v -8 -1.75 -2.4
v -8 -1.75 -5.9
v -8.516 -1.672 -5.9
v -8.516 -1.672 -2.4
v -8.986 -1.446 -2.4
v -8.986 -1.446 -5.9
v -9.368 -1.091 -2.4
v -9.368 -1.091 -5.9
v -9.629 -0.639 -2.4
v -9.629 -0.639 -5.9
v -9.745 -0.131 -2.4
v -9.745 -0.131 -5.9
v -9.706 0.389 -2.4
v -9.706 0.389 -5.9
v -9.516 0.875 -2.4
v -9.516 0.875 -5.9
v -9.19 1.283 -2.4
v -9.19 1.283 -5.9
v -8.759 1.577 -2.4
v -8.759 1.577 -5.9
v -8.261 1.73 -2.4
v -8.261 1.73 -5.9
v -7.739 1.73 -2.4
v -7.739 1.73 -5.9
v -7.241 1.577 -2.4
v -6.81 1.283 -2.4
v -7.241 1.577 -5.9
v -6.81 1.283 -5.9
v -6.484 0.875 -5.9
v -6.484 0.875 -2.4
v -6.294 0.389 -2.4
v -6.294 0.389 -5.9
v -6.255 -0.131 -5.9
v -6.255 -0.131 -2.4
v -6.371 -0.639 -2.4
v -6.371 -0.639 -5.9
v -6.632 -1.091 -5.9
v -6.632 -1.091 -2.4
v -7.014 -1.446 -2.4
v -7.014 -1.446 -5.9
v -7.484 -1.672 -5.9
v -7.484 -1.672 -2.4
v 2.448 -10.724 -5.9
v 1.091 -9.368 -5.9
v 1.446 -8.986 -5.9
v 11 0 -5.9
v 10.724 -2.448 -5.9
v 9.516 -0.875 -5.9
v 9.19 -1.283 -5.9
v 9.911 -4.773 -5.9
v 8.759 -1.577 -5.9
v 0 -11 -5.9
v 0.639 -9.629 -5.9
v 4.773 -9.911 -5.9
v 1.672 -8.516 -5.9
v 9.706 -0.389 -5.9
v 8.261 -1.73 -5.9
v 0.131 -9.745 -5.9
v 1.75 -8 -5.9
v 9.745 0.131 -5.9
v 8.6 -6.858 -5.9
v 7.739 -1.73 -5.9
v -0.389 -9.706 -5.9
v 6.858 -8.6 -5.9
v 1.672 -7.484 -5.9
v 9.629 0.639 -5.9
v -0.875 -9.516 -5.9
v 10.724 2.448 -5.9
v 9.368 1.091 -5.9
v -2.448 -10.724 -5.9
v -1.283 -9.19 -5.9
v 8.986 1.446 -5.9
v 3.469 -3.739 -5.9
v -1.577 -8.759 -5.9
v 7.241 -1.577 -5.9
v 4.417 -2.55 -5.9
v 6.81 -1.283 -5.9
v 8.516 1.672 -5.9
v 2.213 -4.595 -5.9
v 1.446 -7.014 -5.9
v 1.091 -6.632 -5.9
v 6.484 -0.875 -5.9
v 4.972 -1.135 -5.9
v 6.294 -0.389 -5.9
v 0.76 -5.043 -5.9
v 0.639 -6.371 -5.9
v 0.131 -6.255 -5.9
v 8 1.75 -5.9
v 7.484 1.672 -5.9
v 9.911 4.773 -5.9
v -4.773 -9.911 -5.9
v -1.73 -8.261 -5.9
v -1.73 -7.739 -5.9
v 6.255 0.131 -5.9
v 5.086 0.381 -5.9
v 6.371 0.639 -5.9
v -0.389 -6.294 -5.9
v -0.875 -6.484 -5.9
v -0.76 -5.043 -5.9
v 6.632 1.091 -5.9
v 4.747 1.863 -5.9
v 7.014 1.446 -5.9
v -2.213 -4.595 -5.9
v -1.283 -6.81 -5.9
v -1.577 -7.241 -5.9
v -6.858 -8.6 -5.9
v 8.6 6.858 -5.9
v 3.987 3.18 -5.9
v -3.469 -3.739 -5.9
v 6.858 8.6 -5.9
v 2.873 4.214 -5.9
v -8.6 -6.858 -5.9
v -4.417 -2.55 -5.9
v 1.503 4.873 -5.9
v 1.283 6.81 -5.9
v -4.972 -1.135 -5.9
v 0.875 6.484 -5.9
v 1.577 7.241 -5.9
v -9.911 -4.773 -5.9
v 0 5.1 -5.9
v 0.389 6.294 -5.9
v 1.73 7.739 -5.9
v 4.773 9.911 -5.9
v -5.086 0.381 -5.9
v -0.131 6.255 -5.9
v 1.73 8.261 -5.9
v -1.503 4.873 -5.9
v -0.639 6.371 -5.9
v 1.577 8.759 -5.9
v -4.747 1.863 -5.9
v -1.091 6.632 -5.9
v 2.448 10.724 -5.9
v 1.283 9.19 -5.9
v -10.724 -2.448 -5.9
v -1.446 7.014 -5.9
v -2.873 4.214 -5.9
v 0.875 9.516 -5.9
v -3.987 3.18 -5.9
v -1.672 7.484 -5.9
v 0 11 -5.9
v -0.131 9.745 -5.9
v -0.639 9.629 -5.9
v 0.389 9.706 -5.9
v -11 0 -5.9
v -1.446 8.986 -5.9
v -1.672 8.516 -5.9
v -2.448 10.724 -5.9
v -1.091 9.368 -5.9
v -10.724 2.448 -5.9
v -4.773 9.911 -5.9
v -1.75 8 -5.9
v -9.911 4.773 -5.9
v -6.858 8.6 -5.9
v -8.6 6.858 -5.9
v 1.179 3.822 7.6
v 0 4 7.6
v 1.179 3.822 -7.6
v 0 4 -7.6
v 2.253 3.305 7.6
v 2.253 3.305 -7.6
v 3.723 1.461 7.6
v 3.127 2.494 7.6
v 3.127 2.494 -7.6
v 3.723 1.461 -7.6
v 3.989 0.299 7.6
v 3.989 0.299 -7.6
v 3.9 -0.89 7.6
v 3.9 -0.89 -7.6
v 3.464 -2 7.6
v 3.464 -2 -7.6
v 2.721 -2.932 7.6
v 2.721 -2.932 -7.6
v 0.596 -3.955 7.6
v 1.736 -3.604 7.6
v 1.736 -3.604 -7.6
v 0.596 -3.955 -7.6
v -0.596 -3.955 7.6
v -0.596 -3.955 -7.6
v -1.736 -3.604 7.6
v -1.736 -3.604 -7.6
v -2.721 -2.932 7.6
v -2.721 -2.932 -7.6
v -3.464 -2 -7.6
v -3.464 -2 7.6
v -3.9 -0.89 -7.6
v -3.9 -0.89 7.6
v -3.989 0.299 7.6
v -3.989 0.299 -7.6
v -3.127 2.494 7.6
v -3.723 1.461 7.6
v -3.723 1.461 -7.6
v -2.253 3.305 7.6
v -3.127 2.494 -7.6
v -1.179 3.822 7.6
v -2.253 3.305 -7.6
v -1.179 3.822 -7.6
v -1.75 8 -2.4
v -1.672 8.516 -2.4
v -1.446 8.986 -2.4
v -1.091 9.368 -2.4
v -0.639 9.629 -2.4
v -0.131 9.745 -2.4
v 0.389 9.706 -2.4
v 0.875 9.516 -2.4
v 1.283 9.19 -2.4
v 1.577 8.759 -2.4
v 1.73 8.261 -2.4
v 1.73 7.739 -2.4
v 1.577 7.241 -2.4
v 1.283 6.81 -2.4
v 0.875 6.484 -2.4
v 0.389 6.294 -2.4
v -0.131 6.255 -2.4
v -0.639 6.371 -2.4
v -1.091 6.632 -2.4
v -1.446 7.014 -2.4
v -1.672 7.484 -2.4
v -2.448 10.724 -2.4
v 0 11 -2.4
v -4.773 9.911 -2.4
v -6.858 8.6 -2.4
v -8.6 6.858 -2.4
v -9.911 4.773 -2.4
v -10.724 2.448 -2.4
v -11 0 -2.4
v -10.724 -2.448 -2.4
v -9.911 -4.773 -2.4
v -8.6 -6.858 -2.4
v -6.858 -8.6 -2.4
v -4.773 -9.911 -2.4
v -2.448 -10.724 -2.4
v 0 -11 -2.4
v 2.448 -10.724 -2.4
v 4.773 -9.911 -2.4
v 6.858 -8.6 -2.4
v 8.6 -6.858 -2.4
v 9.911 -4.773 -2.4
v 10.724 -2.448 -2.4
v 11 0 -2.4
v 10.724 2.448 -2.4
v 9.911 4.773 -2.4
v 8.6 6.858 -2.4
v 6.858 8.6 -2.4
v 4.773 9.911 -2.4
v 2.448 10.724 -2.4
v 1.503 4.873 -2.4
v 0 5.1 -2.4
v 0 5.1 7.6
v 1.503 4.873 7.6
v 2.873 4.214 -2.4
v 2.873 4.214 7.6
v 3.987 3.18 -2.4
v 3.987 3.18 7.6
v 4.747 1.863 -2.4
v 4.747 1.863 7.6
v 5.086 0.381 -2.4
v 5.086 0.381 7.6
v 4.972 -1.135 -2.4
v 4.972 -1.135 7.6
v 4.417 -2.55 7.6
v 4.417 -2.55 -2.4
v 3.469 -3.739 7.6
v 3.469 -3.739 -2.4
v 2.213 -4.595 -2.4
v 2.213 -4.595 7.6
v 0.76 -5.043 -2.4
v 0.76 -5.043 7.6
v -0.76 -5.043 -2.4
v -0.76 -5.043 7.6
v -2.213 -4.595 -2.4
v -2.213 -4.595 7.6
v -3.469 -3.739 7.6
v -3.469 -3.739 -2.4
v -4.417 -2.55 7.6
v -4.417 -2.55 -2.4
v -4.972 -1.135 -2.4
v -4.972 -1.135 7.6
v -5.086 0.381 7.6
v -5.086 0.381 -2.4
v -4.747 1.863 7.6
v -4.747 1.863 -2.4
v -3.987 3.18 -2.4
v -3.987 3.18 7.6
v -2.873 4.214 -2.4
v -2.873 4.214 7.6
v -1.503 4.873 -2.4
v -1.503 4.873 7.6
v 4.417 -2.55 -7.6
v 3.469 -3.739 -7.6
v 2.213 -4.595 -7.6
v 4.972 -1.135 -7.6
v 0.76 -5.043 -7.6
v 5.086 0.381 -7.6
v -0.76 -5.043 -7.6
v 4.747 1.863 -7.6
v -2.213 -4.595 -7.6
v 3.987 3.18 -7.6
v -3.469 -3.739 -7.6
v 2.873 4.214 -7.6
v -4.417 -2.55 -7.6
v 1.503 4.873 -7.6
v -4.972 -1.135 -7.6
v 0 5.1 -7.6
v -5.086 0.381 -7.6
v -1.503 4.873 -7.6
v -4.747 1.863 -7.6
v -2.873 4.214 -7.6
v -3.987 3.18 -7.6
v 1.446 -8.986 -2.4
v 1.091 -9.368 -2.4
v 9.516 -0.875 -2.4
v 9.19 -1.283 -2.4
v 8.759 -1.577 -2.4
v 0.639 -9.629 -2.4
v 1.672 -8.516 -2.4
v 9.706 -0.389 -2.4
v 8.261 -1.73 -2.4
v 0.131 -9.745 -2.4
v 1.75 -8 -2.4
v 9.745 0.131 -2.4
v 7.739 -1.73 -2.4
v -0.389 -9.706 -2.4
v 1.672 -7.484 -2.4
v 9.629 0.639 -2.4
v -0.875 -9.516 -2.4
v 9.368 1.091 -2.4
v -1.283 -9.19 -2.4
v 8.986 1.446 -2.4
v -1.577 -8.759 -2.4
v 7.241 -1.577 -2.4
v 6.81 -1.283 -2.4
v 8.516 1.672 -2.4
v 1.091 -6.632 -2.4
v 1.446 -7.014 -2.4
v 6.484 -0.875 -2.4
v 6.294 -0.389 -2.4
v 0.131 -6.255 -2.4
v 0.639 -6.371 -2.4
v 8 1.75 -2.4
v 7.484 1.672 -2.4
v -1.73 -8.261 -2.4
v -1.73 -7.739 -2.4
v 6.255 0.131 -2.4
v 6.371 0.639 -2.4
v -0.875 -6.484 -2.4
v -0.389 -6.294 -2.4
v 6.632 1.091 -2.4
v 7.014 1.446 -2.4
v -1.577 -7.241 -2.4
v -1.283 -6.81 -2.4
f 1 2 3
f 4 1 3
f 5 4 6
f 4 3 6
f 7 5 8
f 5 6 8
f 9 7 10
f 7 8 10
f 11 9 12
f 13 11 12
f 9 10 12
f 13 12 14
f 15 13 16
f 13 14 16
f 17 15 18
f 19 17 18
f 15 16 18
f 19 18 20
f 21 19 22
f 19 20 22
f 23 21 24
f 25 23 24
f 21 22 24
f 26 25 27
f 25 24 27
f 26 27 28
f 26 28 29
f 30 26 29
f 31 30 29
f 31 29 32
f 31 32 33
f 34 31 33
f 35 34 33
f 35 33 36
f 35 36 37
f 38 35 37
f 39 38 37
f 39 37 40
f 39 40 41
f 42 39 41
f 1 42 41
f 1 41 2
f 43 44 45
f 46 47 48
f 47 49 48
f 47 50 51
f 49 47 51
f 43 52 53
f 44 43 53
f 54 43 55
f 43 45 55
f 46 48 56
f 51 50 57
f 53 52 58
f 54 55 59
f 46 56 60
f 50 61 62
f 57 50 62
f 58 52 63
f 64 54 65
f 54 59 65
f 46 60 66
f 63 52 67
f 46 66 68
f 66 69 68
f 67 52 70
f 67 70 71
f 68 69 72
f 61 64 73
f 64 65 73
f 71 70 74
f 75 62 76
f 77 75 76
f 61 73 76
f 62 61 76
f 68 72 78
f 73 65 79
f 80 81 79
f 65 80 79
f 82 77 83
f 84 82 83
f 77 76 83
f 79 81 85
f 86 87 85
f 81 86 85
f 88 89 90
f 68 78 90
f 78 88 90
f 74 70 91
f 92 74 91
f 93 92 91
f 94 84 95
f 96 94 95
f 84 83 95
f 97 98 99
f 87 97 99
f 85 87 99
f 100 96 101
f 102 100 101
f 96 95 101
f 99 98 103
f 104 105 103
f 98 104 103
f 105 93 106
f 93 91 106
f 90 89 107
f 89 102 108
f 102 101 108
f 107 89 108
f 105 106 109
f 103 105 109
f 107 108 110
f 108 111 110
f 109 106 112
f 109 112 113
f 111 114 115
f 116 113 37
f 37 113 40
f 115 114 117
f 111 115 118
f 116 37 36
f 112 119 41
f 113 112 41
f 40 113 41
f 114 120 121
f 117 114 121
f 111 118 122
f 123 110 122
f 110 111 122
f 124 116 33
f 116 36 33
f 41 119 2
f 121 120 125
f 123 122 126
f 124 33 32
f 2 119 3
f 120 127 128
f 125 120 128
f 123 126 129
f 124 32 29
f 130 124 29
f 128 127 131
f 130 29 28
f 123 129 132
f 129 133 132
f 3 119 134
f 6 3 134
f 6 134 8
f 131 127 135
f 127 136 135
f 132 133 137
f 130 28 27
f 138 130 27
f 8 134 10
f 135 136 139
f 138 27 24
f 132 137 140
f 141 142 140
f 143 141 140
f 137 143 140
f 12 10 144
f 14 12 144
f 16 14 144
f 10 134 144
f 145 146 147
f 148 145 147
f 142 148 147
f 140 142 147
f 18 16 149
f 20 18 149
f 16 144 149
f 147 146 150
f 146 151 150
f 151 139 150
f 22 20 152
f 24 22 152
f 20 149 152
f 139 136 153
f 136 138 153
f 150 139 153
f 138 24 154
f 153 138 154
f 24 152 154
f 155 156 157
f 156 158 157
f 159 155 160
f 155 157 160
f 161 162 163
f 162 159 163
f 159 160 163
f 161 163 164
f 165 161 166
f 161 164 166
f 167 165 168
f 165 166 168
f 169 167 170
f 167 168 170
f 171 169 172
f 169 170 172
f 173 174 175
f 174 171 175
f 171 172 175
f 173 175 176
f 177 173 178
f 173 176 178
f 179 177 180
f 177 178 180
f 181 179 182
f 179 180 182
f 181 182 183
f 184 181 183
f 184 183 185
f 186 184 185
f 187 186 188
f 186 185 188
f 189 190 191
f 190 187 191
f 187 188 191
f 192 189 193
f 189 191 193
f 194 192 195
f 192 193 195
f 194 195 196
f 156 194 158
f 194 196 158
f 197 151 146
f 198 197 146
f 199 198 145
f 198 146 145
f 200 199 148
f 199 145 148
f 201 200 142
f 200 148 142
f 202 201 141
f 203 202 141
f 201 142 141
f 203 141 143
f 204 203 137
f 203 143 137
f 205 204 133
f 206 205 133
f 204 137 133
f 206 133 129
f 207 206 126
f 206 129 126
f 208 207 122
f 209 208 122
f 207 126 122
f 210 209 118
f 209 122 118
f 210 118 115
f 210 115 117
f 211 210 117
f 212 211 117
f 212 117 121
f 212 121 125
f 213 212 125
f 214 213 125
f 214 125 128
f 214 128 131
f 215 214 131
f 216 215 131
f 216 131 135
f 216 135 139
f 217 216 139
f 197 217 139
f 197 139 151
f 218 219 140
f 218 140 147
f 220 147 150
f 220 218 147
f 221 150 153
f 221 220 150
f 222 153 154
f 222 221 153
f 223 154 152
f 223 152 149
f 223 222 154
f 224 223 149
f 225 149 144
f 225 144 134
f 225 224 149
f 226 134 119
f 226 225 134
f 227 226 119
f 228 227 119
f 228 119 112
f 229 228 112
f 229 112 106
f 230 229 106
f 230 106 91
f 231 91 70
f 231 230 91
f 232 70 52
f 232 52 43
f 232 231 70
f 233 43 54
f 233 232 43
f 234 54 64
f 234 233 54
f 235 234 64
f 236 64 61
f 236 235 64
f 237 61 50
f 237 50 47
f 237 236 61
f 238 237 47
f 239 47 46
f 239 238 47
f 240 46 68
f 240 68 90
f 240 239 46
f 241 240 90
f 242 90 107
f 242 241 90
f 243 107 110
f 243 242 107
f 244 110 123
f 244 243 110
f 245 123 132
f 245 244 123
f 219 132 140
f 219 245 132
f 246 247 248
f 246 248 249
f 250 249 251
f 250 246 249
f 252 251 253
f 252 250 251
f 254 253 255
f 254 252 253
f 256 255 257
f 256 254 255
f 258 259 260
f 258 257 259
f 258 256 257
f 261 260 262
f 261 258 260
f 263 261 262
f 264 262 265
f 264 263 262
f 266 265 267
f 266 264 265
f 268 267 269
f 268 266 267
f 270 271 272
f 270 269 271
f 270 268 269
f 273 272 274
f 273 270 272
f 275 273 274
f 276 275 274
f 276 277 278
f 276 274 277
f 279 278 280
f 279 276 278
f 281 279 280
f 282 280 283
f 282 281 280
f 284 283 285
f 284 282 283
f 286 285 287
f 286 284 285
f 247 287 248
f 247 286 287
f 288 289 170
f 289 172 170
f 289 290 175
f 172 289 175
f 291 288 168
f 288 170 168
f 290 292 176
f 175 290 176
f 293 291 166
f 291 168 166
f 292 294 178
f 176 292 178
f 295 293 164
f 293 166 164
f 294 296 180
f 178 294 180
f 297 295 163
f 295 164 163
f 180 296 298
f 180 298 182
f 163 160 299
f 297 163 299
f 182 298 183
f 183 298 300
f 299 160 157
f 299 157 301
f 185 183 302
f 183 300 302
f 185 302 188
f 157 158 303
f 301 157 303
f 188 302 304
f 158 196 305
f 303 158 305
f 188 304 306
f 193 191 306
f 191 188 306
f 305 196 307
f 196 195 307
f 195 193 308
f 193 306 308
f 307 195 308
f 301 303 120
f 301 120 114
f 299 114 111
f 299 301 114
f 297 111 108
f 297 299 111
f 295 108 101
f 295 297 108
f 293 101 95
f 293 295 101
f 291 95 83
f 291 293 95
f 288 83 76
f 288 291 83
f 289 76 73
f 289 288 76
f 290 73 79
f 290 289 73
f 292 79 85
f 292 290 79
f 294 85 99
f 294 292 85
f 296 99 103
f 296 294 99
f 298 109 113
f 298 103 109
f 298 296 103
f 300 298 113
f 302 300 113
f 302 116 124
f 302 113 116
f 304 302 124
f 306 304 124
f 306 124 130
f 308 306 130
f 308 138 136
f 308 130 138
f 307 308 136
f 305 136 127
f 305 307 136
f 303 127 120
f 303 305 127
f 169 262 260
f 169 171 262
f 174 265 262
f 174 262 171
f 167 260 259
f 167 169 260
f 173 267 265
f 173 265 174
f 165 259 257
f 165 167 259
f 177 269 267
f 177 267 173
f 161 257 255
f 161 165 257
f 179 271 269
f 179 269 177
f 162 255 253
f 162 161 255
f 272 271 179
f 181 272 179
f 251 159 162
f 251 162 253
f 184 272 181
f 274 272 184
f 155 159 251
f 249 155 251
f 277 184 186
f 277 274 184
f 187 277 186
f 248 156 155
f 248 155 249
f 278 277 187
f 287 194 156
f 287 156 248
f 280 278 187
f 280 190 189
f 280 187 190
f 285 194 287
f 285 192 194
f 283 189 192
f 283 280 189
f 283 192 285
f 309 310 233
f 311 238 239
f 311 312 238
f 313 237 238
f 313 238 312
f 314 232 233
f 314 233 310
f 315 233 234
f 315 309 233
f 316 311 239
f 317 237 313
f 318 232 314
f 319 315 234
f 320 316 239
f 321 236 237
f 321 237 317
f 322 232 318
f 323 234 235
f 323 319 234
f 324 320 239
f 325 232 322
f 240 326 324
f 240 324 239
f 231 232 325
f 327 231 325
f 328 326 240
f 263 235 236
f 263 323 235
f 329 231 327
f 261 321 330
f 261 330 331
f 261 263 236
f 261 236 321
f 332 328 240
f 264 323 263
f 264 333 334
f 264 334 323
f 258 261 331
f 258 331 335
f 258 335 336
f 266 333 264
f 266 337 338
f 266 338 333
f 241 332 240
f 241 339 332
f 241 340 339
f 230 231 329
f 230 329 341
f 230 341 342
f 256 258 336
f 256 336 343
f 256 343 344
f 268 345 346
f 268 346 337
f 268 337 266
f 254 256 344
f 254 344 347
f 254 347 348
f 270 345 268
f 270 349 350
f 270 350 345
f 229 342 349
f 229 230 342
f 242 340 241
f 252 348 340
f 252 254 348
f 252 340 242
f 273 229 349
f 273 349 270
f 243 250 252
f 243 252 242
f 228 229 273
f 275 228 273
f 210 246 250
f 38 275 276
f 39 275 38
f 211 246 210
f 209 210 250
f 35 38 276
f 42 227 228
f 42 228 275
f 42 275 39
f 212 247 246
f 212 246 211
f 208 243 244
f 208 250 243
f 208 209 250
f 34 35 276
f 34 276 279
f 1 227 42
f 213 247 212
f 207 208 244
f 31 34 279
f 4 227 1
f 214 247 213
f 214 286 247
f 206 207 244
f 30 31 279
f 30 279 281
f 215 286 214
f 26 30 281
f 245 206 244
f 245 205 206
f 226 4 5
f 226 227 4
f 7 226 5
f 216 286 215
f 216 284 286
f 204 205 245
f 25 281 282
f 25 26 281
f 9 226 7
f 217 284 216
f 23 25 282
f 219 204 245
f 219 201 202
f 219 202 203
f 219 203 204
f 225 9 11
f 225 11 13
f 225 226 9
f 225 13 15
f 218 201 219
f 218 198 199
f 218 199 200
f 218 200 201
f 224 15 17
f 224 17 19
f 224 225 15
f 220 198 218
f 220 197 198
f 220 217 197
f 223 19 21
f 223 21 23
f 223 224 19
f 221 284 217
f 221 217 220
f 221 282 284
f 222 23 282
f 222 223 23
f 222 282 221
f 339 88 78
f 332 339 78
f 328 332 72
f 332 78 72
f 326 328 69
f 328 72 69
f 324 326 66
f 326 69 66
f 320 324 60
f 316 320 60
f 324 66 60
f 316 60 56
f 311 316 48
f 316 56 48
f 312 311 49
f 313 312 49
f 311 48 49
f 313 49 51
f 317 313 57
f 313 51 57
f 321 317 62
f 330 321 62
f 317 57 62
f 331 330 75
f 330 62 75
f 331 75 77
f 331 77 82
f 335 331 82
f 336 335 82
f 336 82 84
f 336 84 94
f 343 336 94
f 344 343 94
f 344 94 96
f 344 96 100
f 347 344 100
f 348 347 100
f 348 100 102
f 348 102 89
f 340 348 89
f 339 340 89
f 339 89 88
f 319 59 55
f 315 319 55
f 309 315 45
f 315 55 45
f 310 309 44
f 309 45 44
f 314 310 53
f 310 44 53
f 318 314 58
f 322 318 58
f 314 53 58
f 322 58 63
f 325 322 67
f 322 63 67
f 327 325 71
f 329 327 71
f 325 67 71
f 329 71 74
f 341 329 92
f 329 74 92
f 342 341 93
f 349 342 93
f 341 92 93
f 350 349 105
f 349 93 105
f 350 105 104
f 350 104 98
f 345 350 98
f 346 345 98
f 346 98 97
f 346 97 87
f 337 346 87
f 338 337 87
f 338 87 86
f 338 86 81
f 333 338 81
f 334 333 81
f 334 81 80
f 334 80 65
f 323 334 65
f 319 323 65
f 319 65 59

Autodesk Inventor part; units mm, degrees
ref_plane "YZ Plane" through (0, 0, 0) normal (1, 0, 0) x (0, 1, 0)
ref_plane "XZ Plane" through (0, 0, 0) normal (0, 1, 0) x (-1, 0, 0)
ref_plane "XY Plane" through (0, 0, 0) normal (0, 0, 1) x (1, 0, 0)
sketch "Sketch1" plane through (0, 0, 0) normal (1, 0, 0) x (0, 1, 0)
  line L0 (5.1, -7.6) -> (0, -7.6)
  line L1 (0, -7.6) -> (0, 7.6) construction
  line L2 (0, 7.6) -> (5.1, 7.6)
  line L3 (5.1, 7.6) -> (5.1, -7.6)
  line L4 (11, -2.4) -> (5.1, -2.4)
  line L5 (5.1, -2.4) -> (5.1, -5.9)
  line L6 (5.1, -5.9) -> (11, -5.9)
  line L7 (11, -5.9) -> (11, -2.4)
  line L8 (4, 7.6) -> (4, -7.6)
  point P0 (0, 0)
  point P1 (0, 0)
  dimension "d0" = 5.1
  dimension "d1" = 15.2
  dimension "d2" = 3.5
  dimension "d3" = 10
  dimension "d4" = 11
  dimension "d5" = 0
  dimension "d6" = 4
revolve "Revolution1" add sketch "Sketch1" angle 360 about axis through (0, 0, -7.6) along (0, 0, 1)
sketch "Sketch2" plane through (0, 0, -5.9) normal (0, 0, -1) x (-1, 0, 0)
  circle A0 centre (0, 0) radius 11 projected
  circle A1 centre (0, 0) radius 5.1 projected
  circle A2 centre (0, 8) radius 1.75
  point P0 (0, 0)
  dimension "d8" = 3.5
  dimension "d9" = 8
extrude "Extrusion1" cut sketch "Sketch2" against normal blind 4 contours A2
pattern_circular "Circular Pattern1" count 4 over 360 about axis through (0, 0, -10) along (0, 0, 1) of "Extrusion1"
properties part number "LeadScrewNut"
